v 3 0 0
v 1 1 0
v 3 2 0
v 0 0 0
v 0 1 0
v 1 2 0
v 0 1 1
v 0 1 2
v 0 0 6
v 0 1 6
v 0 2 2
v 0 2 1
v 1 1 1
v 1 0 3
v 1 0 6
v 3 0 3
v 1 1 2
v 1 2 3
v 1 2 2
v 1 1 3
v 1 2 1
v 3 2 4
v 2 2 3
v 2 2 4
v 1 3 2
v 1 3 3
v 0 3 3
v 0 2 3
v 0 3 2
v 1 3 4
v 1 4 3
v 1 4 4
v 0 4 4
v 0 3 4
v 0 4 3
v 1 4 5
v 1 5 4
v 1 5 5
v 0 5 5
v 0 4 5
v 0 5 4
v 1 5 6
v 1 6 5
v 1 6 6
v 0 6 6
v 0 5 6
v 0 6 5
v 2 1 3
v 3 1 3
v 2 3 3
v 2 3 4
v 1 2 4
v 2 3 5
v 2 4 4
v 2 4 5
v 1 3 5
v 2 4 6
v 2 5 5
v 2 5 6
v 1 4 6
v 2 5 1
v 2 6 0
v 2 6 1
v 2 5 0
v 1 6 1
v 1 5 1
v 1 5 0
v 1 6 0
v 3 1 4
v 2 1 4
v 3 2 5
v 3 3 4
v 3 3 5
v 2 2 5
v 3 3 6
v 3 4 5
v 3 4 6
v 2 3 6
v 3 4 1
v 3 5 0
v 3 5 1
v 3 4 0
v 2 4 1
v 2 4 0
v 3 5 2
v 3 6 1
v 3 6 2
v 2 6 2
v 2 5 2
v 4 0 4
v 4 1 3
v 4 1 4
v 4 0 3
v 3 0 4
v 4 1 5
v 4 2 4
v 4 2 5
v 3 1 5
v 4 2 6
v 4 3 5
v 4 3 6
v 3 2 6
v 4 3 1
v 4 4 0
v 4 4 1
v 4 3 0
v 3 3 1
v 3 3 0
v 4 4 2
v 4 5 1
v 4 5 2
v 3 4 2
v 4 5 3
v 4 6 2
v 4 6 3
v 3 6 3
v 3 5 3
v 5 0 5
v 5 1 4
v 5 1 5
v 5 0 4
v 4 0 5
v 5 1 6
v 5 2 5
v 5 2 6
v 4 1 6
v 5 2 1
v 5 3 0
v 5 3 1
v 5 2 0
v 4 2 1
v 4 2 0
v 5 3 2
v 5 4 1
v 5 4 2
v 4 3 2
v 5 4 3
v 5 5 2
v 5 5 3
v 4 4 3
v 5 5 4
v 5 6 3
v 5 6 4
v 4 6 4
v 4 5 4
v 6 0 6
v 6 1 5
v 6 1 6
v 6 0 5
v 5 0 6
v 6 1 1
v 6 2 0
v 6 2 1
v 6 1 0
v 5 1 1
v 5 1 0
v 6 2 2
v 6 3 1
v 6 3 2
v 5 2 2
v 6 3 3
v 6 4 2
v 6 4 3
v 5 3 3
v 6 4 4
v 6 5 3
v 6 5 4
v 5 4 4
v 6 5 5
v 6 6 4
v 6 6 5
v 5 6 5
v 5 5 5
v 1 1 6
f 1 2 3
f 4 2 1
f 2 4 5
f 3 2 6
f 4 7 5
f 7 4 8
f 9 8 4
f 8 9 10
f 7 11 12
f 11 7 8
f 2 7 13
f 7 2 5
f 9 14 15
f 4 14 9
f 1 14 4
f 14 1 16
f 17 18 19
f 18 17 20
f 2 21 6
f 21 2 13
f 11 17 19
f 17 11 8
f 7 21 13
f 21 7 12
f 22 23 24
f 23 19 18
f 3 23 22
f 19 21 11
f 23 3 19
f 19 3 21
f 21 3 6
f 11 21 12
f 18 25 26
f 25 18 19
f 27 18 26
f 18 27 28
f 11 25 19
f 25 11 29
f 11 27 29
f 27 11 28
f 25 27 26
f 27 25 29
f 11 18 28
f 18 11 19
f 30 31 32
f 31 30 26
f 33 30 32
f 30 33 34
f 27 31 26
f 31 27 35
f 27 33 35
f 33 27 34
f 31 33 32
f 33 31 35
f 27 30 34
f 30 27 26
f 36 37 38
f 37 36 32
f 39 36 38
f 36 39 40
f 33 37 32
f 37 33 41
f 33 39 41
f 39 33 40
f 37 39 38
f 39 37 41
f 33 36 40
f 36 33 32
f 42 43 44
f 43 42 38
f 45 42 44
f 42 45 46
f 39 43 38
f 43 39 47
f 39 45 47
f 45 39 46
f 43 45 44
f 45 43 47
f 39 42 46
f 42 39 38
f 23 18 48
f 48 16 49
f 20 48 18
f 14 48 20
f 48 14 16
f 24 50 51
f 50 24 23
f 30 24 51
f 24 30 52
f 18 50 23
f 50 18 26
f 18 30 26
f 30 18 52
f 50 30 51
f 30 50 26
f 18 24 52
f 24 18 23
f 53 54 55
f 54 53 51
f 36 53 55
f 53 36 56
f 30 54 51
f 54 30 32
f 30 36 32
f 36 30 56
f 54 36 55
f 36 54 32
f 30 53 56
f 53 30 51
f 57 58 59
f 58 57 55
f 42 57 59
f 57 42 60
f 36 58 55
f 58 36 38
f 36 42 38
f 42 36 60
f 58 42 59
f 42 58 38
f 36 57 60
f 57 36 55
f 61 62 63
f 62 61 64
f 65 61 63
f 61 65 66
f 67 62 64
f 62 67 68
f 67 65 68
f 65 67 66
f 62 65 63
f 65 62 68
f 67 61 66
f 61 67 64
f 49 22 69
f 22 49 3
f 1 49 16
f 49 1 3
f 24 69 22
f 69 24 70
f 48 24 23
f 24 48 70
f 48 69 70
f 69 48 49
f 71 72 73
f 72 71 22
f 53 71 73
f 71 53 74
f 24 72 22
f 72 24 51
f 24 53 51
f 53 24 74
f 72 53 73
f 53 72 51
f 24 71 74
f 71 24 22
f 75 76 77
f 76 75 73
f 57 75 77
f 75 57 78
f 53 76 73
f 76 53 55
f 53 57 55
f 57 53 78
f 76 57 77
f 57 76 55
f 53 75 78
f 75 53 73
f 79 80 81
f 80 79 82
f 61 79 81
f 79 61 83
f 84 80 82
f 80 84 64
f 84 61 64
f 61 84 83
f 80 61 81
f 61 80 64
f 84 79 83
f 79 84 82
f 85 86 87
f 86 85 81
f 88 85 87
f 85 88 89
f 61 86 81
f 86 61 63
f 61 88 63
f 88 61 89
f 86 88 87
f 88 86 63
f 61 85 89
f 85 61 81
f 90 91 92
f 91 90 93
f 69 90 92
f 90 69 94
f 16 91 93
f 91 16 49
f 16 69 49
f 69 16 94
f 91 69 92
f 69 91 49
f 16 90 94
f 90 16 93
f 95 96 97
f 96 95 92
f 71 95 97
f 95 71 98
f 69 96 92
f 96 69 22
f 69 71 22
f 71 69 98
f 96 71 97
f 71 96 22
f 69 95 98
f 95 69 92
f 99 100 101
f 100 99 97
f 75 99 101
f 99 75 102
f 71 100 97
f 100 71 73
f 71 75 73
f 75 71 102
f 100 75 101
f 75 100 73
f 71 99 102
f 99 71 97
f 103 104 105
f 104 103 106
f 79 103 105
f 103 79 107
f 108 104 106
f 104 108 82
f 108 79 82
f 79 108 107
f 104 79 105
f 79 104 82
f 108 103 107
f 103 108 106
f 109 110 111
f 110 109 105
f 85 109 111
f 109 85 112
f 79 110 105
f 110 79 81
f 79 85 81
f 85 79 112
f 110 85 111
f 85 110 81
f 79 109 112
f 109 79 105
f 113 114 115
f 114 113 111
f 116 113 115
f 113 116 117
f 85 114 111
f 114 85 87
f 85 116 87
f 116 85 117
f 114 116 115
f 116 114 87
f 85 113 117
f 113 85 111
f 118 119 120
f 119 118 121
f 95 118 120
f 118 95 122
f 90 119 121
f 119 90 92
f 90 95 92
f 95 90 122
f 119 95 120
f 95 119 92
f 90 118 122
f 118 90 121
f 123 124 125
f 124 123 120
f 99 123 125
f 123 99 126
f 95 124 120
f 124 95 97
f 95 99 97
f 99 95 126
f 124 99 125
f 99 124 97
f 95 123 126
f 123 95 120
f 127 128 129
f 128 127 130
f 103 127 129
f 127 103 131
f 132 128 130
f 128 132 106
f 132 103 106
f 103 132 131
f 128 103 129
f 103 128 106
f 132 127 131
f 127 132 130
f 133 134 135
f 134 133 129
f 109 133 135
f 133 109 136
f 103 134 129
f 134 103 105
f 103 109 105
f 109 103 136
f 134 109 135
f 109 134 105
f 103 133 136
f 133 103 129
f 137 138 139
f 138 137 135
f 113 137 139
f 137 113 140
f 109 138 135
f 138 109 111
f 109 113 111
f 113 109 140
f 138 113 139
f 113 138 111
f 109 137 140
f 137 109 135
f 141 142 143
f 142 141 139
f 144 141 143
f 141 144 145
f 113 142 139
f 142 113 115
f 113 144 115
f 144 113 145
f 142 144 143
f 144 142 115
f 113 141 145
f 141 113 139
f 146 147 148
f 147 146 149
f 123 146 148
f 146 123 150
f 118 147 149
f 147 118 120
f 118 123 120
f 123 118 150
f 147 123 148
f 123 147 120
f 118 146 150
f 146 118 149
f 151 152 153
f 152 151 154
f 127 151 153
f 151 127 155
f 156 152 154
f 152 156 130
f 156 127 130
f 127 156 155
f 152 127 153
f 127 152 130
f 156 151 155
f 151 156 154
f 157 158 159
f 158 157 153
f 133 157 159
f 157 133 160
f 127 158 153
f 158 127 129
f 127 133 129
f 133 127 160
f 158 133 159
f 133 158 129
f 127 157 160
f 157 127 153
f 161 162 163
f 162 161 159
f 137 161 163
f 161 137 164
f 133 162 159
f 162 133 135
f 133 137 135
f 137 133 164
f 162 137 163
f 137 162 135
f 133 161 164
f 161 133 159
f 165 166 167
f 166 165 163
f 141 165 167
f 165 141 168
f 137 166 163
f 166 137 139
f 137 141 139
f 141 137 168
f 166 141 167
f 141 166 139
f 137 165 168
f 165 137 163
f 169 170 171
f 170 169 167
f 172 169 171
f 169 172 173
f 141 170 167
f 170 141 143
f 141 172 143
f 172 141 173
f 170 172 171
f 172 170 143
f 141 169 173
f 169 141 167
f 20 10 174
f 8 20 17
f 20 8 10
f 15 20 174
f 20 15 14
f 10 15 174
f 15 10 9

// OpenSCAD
union() {
    translate([0, 0, 0]) cube([1, 1, 1]);
    translate([0, 1, 1]) cube([1, 1, 1]);
    translate([0, 2, 2]) cube([1, 1, 1]);
    translate([0, 3, 3]) cube([1, 1, 1]);
    translate([0, 4, 4]) cube([1, 1, 1]);
    translate([0, 5, 5]) cube([1, 1, 1]);
    translate([1, 0, 1]) cube([1, 1, 1]);
    translate([1, 1, 2]) cube([1, 1, 1]);
    translate([1, 2, 3]) cube([1, 1, 1]);
    translate([1, 3, 4]) cube([1, 1, 1]);
    translate([1, 4, 5]) cube([1, 1, 1]);
    translate([1, 5, 0]) cube([1, 1, 1]);
    translate([2, 0, 2]) cube([1, 1, 1]);
    translate([2, 1, 3]) cube([1, 1, 1]);
    translate([2, 2, 4]) cube([1, 1, 1]);
    translate([2, 3, 5]) cube([1, 1, 1]);
    translate([2, 4, 0]) cube([1, 1, 1]);
    translate([2, 5, 1]) cube([1, 1, 1]);
    translate([3, 0, 3]) cube([1, 1, 1]);
    translate([3, 1, 4]) cube([1, 1, 1]);
    translate([3, 2, 5]) cube([1, 1, 1]);
    translate([3, 3, 0]) cube([1, 1, 1]);
    translate([3, 4, 1]) cube([1, 1, 1]);
    translate([3, 5, 2]) cube([1, 1, 1]);
    translate([4, 0, 4]) cube([1, 1, 1]);
    translate([4, 1, 5]) cube([1, 1, 1]);
    translate([4, 2, 0]) cube([1, 1, 1]);
    translate([4, 3, 1]) cube([1, 1, 1]);
    translate([4, 4, 2]) cube([1, 1, 1]);
    translate([4, 5, 3]) cube([1, 1, 1]);
    translate([5, 0, 5]) cube([1, 1, 1]);
    translate([5, 1, 0]) cube([1, 1, 1]);
    translate([5, 2, 1]) cube([1, 1, 1]);
    translate([5, 3, 2]) cube([1, 1, 1]);
    translate([5, 4, 3]) cube([1, 1, 1]);
    translate([5, 5, 4]) cube([1, 1, 1]);
    translate([0, 0, 1]) cube([1, 1, 1]);
    translate([0, 0, 2]) cube([1, 1, 1]);
    translate([0, 0, 3]) cube([1, 1, 1]);
    translate([0, 0, 4]) cube([1, 1, 1]);
    translate([0, 0, 5]) cube([1, 1, 1]);
    translate([1, 0, 0]) cube([1, 1, 1]);
    translate([1, 0, 2]) cube([1, 1, 1]);
    translate([1, 1, 0]) cube([1, 1, 1]);
    translate([1, 1, 1]) cube([1, 1, 1]);
    translate([2, 0, 0]) cube([1, 1, 1]);
    translate([2, 0, 1]) cube([1, 1, 1]);
    translate([2, 1, 0]) cube([1, 1, 1]);
    translate([2, 1, 1]) cube([1, 1, 1]);
    translate([2, 1, 2]) cube([1, 1, 1]);
}
